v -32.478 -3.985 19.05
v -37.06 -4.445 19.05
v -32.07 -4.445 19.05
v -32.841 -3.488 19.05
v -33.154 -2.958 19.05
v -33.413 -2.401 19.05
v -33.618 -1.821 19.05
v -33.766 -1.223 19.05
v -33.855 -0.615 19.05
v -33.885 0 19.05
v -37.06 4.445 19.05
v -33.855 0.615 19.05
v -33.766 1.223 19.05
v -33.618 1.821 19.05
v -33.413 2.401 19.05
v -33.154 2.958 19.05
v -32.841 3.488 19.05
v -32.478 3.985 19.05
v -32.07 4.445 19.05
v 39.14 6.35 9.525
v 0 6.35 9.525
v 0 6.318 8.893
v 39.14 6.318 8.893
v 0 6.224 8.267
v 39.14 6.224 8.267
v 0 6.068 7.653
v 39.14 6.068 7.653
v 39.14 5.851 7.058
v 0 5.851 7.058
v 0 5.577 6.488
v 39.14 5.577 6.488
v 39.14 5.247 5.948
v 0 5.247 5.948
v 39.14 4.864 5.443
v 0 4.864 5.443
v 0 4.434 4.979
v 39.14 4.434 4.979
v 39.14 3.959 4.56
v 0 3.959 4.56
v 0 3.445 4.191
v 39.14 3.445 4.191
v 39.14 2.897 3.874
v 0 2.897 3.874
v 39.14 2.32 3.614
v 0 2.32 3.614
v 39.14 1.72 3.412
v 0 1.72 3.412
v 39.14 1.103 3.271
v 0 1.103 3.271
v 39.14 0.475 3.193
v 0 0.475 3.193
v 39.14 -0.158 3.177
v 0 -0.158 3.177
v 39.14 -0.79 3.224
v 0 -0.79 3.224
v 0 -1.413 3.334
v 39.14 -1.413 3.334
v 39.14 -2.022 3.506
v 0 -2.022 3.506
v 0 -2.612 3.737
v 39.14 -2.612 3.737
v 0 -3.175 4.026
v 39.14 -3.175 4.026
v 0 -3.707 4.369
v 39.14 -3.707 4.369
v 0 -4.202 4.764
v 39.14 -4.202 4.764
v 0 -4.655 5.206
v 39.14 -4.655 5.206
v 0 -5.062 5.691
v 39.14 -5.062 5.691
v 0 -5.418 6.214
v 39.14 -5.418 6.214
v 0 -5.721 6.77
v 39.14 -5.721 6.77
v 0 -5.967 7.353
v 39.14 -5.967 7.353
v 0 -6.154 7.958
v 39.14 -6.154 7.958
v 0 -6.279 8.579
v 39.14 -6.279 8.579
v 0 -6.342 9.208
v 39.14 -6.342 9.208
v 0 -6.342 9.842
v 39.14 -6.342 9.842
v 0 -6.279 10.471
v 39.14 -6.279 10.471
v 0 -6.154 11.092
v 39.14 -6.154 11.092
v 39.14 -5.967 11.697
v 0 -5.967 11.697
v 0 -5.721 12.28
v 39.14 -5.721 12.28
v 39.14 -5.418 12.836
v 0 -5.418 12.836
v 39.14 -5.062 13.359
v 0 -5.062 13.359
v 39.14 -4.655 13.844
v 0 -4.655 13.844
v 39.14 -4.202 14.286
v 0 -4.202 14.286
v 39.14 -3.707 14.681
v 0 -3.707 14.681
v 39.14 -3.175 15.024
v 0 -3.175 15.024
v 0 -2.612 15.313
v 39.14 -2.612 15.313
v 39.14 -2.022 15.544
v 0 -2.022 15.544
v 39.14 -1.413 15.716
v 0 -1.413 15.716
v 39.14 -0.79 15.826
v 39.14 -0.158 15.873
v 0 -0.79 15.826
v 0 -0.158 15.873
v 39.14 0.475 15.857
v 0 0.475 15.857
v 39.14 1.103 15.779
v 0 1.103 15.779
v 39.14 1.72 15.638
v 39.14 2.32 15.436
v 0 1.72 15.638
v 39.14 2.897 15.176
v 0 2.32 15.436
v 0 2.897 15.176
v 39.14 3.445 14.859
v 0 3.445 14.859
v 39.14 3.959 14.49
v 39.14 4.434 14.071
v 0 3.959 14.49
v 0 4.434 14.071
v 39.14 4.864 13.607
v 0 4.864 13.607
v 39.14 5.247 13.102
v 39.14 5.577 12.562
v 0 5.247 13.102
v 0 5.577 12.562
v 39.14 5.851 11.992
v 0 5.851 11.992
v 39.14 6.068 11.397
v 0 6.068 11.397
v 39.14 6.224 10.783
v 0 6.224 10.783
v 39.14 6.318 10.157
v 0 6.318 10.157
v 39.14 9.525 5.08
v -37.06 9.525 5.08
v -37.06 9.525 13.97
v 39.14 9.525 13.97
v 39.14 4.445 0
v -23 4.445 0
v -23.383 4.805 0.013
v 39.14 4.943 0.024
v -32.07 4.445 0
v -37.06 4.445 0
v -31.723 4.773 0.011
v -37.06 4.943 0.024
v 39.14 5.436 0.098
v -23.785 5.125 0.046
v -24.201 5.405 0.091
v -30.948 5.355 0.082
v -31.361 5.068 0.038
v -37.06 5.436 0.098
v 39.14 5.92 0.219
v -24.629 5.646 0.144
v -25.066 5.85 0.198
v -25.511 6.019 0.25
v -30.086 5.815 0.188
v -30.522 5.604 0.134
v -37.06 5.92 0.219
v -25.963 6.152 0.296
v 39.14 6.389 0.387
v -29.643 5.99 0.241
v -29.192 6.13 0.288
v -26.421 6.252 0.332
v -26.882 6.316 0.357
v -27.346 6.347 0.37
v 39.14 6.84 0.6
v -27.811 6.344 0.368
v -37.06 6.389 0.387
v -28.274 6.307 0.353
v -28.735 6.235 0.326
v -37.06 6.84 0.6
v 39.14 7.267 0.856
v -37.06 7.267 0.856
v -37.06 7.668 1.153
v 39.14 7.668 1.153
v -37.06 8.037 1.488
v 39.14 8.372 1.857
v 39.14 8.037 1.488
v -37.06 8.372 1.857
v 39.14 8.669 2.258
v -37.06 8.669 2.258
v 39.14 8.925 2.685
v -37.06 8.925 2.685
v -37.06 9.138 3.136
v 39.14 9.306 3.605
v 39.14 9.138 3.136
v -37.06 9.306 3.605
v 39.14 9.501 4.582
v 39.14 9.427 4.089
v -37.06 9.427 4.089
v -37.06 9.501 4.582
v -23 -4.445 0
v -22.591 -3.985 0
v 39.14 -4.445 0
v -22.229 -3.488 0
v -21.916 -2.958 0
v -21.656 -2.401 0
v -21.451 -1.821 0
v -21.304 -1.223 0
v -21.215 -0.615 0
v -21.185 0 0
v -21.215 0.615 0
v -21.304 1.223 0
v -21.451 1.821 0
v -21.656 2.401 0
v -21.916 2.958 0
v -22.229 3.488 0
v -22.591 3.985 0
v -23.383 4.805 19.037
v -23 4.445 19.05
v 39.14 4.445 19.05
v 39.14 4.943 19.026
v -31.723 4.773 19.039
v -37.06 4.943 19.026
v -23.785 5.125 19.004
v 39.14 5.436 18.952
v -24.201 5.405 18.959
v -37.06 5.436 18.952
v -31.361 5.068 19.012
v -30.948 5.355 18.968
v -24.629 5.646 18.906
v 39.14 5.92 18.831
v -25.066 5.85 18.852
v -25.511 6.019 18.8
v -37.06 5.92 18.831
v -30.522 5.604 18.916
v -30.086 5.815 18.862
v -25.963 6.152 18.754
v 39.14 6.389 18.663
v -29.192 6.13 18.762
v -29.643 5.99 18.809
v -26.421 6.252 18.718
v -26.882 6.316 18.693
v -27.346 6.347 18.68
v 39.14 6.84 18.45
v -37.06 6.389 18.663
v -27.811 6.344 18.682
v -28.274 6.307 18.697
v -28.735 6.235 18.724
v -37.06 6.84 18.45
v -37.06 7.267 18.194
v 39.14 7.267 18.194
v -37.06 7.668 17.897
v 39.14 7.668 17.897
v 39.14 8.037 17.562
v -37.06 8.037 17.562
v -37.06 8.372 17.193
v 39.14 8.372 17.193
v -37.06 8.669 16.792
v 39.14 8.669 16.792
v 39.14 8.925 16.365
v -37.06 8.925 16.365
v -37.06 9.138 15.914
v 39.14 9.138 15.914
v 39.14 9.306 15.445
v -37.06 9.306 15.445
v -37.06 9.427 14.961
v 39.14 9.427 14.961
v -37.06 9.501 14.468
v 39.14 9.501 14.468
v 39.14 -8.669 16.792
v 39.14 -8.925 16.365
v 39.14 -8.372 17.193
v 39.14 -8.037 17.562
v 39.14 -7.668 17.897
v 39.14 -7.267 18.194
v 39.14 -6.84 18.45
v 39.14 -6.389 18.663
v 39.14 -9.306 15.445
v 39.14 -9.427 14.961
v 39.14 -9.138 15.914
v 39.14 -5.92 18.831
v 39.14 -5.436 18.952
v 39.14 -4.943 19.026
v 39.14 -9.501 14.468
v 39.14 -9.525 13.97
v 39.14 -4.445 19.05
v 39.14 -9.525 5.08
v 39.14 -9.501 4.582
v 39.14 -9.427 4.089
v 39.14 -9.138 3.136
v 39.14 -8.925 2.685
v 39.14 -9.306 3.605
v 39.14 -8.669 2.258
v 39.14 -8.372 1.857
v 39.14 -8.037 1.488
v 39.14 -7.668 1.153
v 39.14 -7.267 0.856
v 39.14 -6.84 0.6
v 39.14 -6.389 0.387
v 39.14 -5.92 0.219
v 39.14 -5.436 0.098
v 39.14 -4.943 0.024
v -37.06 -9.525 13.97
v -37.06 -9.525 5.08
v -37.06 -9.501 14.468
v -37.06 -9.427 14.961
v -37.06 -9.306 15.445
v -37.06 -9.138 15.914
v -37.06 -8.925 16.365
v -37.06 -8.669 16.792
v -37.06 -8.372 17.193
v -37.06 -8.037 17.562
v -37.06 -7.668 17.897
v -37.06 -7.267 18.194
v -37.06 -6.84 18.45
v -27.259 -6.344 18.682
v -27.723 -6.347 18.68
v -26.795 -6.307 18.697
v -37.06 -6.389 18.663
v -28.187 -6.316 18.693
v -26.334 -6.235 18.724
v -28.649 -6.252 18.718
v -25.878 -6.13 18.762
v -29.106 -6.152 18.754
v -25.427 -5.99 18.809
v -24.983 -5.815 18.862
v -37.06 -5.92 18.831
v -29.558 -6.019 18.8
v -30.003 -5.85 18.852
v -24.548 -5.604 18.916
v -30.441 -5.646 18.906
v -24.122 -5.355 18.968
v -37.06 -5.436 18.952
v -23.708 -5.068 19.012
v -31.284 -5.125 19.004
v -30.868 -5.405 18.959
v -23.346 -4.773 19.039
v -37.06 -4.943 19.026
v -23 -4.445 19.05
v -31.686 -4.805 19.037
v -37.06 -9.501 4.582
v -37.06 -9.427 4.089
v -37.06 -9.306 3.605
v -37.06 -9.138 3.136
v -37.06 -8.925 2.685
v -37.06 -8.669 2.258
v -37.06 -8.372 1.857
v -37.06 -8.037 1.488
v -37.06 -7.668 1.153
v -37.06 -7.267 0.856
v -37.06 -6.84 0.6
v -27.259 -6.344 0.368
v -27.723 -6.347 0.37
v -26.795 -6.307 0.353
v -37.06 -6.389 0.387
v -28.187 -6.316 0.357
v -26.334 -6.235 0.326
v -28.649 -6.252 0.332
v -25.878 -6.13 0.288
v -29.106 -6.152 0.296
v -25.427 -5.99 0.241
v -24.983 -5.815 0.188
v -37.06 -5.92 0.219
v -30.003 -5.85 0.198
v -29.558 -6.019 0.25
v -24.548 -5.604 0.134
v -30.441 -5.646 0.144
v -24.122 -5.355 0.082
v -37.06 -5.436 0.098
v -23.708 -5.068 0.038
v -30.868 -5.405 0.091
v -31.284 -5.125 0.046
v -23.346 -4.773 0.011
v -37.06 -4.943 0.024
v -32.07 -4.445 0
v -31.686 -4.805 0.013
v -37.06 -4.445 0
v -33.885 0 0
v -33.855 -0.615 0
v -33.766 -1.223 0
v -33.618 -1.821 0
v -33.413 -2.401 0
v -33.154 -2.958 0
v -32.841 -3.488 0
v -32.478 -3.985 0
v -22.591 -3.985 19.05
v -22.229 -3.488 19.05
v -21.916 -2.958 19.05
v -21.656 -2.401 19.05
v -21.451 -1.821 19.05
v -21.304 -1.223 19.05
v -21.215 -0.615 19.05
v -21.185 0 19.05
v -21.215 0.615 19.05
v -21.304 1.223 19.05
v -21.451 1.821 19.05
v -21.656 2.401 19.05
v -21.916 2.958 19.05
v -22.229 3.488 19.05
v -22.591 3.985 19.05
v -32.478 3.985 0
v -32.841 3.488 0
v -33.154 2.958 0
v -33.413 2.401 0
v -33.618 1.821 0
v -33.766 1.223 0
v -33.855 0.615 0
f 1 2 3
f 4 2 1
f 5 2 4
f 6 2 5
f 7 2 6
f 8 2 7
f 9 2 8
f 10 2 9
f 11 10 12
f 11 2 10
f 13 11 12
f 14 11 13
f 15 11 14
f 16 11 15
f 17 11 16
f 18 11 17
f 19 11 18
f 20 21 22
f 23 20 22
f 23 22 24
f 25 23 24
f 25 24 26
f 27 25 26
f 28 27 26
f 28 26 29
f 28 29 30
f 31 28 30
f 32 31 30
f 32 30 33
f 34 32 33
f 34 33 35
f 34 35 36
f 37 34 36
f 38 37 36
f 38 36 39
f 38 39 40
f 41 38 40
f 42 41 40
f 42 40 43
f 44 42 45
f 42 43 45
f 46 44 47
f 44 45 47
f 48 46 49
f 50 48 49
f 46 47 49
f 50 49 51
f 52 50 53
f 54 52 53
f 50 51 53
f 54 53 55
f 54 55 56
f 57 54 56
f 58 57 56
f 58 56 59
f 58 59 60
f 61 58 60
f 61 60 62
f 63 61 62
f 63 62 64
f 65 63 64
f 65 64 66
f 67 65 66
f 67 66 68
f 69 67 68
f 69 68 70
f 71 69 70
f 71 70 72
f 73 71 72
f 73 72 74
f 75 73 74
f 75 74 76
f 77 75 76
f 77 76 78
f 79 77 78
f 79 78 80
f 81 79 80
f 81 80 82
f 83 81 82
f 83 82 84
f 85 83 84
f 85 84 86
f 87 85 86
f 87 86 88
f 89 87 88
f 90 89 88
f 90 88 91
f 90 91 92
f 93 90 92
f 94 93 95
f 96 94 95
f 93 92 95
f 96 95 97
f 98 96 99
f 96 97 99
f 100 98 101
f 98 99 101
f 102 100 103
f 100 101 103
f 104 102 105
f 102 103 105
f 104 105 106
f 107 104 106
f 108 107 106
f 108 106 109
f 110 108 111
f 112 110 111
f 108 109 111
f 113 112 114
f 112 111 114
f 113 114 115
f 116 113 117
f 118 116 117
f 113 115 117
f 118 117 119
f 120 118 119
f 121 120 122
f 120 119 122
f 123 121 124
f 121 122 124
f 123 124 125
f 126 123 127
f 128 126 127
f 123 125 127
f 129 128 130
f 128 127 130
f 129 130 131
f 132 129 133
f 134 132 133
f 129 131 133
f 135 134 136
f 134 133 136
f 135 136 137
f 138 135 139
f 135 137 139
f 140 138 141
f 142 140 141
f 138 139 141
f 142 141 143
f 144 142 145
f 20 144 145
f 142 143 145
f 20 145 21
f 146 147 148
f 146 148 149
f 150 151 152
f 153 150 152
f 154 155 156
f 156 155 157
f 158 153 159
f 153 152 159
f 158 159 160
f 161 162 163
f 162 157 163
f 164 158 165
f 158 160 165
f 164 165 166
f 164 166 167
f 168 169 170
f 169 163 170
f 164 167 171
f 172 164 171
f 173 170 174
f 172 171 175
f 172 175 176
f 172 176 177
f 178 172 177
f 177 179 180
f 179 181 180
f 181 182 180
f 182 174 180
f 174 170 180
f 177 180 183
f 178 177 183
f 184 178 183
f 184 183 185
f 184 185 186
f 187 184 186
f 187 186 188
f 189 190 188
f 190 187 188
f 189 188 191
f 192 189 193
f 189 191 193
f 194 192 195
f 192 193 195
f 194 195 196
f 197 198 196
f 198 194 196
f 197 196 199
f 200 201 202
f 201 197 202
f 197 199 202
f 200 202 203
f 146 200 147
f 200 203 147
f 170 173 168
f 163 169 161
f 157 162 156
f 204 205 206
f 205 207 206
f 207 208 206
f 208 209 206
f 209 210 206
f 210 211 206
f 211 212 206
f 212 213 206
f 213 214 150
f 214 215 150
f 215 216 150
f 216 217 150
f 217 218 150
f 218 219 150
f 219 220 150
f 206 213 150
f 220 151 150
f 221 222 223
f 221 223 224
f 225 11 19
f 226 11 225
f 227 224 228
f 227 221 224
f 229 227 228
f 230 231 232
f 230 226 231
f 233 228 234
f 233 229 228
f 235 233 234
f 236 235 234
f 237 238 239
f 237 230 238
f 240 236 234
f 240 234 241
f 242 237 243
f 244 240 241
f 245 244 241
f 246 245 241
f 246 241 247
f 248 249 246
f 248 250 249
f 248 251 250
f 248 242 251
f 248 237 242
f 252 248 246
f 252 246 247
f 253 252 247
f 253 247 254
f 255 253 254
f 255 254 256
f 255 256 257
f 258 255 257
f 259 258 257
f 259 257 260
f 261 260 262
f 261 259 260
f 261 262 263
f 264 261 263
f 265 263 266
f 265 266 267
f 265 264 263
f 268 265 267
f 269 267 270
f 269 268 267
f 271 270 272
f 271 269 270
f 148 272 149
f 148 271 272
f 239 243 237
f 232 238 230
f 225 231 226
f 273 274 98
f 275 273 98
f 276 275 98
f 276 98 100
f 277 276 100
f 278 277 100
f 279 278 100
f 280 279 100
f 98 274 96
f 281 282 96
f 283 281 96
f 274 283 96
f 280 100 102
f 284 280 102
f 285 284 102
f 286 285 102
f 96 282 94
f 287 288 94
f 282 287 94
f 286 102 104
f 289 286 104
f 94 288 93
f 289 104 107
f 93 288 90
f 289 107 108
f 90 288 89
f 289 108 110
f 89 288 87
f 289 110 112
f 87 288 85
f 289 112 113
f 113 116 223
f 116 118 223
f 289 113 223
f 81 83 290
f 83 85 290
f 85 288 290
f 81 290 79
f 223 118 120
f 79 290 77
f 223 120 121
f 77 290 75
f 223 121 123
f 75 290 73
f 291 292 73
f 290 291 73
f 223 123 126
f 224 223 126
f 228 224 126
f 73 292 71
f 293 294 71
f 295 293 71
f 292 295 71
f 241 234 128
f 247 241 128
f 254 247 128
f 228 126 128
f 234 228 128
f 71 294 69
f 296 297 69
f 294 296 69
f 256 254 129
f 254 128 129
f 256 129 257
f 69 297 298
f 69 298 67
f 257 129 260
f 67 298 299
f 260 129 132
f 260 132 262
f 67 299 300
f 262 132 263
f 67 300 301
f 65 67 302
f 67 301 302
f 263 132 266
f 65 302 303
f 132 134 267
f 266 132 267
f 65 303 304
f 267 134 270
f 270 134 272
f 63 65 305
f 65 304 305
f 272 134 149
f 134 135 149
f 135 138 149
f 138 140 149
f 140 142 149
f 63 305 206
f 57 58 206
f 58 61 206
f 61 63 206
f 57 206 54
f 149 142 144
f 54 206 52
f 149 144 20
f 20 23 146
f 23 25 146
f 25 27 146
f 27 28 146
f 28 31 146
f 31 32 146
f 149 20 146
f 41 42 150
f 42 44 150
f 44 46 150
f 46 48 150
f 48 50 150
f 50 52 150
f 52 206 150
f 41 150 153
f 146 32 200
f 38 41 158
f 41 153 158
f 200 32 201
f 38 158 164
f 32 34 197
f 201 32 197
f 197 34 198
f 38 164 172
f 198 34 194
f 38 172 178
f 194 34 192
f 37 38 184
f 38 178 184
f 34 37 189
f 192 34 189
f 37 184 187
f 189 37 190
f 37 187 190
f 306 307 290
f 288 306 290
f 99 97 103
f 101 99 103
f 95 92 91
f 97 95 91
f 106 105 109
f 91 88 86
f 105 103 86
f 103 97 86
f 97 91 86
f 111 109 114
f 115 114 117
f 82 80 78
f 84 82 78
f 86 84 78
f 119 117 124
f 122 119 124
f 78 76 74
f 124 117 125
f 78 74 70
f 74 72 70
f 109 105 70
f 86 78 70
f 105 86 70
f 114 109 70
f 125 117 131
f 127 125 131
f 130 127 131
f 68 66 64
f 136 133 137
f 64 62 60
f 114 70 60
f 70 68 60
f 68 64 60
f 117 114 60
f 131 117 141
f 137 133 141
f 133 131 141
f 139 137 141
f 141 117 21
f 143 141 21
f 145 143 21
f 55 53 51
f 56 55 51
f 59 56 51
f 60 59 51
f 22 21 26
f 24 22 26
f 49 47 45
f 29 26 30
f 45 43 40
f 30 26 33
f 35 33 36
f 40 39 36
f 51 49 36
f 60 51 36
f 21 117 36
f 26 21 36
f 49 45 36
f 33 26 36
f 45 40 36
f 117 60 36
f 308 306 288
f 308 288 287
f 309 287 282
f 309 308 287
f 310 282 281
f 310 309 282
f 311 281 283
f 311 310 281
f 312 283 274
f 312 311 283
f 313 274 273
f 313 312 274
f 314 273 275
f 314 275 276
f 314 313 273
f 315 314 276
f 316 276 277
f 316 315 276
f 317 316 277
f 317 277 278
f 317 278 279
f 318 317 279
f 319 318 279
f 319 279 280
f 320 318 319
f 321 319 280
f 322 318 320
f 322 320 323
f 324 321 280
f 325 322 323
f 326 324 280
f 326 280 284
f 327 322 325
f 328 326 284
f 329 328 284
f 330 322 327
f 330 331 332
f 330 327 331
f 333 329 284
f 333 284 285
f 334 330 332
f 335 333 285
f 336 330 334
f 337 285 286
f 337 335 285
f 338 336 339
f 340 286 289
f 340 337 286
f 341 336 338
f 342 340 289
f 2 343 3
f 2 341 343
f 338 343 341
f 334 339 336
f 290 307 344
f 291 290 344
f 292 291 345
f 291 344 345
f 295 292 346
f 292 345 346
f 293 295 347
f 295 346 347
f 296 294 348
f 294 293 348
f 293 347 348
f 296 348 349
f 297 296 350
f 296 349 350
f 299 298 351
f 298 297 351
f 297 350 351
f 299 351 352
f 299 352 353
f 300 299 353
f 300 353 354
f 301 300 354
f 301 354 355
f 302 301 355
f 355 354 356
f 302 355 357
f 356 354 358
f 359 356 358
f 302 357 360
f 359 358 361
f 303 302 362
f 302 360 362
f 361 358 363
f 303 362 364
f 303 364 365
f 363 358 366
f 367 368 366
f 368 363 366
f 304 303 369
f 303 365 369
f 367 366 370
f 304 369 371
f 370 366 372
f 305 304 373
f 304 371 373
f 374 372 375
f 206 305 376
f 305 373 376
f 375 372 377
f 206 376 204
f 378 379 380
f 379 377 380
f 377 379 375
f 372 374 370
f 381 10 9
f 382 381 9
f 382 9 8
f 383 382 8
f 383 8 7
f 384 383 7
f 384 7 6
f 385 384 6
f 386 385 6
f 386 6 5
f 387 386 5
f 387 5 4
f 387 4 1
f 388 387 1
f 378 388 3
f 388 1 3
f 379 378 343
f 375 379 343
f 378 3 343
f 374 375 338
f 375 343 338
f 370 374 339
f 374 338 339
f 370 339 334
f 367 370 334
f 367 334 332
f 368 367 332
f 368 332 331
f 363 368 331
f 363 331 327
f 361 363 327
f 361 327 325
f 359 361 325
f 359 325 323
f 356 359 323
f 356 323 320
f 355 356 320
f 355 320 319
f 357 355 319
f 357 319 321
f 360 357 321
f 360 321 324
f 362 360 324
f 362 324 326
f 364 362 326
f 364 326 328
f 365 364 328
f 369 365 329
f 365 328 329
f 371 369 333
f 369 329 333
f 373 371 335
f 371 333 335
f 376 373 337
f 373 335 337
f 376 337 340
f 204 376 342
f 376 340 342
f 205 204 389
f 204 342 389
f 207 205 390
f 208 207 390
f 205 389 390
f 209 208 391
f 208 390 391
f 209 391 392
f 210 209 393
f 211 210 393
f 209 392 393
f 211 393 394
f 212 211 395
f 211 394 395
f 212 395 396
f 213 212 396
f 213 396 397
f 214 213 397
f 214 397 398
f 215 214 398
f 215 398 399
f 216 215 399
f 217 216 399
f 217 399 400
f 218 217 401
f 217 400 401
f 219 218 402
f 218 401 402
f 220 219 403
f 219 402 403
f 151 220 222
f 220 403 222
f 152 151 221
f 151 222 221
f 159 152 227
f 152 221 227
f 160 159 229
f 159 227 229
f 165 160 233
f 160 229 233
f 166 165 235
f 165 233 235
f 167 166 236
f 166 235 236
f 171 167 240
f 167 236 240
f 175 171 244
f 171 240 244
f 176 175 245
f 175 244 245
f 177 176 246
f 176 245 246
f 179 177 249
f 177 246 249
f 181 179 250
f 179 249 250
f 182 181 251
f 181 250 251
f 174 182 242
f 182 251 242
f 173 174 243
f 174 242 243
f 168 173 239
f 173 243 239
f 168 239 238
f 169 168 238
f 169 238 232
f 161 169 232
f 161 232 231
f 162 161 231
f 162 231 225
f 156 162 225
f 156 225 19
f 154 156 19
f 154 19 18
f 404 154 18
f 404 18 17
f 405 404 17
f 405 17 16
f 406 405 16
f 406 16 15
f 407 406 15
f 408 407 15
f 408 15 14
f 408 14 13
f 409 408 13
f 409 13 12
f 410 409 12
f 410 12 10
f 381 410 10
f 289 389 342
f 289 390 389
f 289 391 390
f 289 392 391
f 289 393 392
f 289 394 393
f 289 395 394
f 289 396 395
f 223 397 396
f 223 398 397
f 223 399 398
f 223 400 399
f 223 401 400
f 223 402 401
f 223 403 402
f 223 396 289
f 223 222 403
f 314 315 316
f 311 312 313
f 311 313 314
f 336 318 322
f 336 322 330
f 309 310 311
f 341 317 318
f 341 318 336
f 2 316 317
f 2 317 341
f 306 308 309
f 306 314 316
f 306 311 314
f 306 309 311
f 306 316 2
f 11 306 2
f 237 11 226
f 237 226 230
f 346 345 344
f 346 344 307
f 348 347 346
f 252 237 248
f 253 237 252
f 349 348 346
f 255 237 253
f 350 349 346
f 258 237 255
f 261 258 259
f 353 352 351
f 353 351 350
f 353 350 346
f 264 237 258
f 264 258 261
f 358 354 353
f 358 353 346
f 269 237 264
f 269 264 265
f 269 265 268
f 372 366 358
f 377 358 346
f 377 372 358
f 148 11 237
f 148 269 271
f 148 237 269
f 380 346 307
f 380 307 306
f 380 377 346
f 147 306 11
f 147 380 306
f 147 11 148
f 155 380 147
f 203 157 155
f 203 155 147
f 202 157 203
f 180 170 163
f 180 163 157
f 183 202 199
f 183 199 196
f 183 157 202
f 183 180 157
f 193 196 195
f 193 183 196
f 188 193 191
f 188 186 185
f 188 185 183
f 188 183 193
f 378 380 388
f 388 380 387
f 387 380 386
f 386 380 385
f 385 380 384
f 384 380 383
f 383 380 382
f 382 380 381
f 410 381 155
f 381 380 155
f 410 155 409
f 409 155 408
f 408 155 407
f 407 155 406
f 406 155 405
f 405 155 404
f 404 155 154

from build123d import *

# Parameters (mm, degrees)
F0_W        = 76.2
F0_H        = 19.05
F1_DEPTH    = 19.05
F3_D        = 12.7
F3_DEPTH    = 39.1412730195
F5_D        = 12.7
F6_T1_DEPTH = 101.6


# Not quite as in the source:
# - a fillet or chamfer that OpenCascade refuses, or shapes differently, is made with other operations: its cross-section is extruded or revolved along the edge and cut away or added


with BuildPart() as f1:
    # F0 (on Top) → F1 (new body)
    with BuildSketch(Plane.XY):
        with Locations((1.0402730195, 0)):
            Rectangle(F0_W, F0_H)
    extrude(amount=F1_DEPTH)

    # F3 (through all, one way)
    with BuildSketch(Plane(origin=(0, 0, 0), x_dir=(0, 1, 0), z_dir=(-1, 0, 0))):
        with Locations((0, -9.525)):
            Circle(F3_D / 2)
    extrude(amount=-F3_DEPTH, mode=Mode.SUBTRACT)

    # F5 (through all)
    with Locations(Plane(origin=(0, 0, 0), x_dir=(1, 0, 0), z_dir=(0, 0, -1))):
        with Locations((-27.5347269805, 0)):
            Hole(F5_D / 2)

    # F6: fillet of radius 5.08 on 4 edges, made by hand

    # F6_s2 → F6_t1 (cut)
    with BuildSketch(Plane.YZ.offset(-49.7597269805)):
        with BuildLine():
            ThreePointArc((4.445, 19.05), (8.0371024484, 17.5621024484), (9.525, 13.97))
            Line((9.525, 13.97), (9.525, 19.05))
            Line((9.525, 19.05), (4.445, 19.05))
        make_face()
        with BuildLine():
            ThreePointArc((-9.525, 13.97), (-8.0371024484, 17.5621024484), (-4.445, 19.05))
            Line((-4.445, 19.05), (-9.525, 19.05))
            Line((-9.525, 19.05), (-9.525, 13.97))
        make_face()
        with BuildLine():
            ThreePointArc((-9.525, 5.08), (-8.0371024484, 1.4878975516), (-4.445, 0))
            Line((-4.445, 0), (-9.525, 0))
            Line((-9.525, 0), (-9.525, 5.08))
        make_face()
        with BuildLine():
            ThreePointArc((4.445, 0), (8.0371024484, 1.4878975516), (9.525, 5.08))
            Line((9.525, 5.08), (9.525, 0))
            Line((9.525, 0), (4.445, 0))
        make_face()
    extrude(amount=F6_T1_DEPTH, mode=Mode.SUBTRACT)


solid = f1.part
